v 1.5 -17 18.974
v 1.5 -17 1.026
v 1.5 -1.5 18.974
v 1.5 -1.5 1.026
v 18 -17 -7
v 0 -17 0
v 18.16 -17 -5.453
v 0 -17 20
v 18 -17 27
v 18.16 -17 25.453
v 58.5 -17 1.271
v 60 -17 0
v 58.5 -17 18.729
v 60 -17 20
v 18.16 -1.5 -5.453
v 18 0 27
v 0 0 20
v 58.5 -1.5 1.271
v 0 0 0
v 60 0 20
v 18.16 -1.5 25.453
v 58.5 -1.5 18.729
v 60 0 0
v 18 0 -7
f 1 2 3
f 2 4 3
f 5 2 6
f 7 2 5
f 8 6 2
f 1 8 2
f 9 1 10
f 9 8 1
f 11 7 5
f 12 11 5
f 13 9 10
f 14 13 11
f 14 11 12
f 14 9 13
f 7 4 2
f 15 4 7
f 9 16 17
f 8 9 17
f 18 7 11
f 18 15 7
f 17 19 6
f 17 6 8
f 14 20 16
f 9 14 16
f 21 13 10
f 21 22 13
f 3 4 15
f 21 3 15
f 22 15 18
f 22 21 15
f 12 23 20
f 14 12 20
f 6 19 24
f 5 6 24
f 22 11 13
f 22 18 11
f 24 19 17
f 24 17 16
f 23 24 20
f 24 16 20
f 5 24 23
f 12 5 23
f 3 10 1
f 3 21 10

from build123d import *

# Parameters (mm, degrees)
F0_W     = 18
F0_H     = 20
F0_W_2   = 42
F1_DEPTH = 17
F2_T     = -1.5


with BuildPart() as f1:
    # F0 (on Front) → F1 (new body)
    with BuildSketch(Plane.XZ):
        with Locations((9, 10)):
            Rectangle(F0_W, F0_H)
        Polygon((18, 0), (0, 0), (18, -7), align=None)
        with Locations((39, 10)):
            Rectangle(F0_W_2, F0_H)
        Polygon((60, 0), (18, 0), (18, -7), align=None)
        Polygon((18, 27), (0, 20), (18, 20), align=None)
        Polygon((18, 27), (18, 20), (60, 20), align=None)
    extrude(amount=F1_DEPTH)

    # F2
    f2_openings = [f1.faces().sort_by_distance(p)[0] for p in [
        (28.962963, -17, 10),
    ]]
    offset(amount=F2_T, openings=f2_openings)


solid = f1.part
